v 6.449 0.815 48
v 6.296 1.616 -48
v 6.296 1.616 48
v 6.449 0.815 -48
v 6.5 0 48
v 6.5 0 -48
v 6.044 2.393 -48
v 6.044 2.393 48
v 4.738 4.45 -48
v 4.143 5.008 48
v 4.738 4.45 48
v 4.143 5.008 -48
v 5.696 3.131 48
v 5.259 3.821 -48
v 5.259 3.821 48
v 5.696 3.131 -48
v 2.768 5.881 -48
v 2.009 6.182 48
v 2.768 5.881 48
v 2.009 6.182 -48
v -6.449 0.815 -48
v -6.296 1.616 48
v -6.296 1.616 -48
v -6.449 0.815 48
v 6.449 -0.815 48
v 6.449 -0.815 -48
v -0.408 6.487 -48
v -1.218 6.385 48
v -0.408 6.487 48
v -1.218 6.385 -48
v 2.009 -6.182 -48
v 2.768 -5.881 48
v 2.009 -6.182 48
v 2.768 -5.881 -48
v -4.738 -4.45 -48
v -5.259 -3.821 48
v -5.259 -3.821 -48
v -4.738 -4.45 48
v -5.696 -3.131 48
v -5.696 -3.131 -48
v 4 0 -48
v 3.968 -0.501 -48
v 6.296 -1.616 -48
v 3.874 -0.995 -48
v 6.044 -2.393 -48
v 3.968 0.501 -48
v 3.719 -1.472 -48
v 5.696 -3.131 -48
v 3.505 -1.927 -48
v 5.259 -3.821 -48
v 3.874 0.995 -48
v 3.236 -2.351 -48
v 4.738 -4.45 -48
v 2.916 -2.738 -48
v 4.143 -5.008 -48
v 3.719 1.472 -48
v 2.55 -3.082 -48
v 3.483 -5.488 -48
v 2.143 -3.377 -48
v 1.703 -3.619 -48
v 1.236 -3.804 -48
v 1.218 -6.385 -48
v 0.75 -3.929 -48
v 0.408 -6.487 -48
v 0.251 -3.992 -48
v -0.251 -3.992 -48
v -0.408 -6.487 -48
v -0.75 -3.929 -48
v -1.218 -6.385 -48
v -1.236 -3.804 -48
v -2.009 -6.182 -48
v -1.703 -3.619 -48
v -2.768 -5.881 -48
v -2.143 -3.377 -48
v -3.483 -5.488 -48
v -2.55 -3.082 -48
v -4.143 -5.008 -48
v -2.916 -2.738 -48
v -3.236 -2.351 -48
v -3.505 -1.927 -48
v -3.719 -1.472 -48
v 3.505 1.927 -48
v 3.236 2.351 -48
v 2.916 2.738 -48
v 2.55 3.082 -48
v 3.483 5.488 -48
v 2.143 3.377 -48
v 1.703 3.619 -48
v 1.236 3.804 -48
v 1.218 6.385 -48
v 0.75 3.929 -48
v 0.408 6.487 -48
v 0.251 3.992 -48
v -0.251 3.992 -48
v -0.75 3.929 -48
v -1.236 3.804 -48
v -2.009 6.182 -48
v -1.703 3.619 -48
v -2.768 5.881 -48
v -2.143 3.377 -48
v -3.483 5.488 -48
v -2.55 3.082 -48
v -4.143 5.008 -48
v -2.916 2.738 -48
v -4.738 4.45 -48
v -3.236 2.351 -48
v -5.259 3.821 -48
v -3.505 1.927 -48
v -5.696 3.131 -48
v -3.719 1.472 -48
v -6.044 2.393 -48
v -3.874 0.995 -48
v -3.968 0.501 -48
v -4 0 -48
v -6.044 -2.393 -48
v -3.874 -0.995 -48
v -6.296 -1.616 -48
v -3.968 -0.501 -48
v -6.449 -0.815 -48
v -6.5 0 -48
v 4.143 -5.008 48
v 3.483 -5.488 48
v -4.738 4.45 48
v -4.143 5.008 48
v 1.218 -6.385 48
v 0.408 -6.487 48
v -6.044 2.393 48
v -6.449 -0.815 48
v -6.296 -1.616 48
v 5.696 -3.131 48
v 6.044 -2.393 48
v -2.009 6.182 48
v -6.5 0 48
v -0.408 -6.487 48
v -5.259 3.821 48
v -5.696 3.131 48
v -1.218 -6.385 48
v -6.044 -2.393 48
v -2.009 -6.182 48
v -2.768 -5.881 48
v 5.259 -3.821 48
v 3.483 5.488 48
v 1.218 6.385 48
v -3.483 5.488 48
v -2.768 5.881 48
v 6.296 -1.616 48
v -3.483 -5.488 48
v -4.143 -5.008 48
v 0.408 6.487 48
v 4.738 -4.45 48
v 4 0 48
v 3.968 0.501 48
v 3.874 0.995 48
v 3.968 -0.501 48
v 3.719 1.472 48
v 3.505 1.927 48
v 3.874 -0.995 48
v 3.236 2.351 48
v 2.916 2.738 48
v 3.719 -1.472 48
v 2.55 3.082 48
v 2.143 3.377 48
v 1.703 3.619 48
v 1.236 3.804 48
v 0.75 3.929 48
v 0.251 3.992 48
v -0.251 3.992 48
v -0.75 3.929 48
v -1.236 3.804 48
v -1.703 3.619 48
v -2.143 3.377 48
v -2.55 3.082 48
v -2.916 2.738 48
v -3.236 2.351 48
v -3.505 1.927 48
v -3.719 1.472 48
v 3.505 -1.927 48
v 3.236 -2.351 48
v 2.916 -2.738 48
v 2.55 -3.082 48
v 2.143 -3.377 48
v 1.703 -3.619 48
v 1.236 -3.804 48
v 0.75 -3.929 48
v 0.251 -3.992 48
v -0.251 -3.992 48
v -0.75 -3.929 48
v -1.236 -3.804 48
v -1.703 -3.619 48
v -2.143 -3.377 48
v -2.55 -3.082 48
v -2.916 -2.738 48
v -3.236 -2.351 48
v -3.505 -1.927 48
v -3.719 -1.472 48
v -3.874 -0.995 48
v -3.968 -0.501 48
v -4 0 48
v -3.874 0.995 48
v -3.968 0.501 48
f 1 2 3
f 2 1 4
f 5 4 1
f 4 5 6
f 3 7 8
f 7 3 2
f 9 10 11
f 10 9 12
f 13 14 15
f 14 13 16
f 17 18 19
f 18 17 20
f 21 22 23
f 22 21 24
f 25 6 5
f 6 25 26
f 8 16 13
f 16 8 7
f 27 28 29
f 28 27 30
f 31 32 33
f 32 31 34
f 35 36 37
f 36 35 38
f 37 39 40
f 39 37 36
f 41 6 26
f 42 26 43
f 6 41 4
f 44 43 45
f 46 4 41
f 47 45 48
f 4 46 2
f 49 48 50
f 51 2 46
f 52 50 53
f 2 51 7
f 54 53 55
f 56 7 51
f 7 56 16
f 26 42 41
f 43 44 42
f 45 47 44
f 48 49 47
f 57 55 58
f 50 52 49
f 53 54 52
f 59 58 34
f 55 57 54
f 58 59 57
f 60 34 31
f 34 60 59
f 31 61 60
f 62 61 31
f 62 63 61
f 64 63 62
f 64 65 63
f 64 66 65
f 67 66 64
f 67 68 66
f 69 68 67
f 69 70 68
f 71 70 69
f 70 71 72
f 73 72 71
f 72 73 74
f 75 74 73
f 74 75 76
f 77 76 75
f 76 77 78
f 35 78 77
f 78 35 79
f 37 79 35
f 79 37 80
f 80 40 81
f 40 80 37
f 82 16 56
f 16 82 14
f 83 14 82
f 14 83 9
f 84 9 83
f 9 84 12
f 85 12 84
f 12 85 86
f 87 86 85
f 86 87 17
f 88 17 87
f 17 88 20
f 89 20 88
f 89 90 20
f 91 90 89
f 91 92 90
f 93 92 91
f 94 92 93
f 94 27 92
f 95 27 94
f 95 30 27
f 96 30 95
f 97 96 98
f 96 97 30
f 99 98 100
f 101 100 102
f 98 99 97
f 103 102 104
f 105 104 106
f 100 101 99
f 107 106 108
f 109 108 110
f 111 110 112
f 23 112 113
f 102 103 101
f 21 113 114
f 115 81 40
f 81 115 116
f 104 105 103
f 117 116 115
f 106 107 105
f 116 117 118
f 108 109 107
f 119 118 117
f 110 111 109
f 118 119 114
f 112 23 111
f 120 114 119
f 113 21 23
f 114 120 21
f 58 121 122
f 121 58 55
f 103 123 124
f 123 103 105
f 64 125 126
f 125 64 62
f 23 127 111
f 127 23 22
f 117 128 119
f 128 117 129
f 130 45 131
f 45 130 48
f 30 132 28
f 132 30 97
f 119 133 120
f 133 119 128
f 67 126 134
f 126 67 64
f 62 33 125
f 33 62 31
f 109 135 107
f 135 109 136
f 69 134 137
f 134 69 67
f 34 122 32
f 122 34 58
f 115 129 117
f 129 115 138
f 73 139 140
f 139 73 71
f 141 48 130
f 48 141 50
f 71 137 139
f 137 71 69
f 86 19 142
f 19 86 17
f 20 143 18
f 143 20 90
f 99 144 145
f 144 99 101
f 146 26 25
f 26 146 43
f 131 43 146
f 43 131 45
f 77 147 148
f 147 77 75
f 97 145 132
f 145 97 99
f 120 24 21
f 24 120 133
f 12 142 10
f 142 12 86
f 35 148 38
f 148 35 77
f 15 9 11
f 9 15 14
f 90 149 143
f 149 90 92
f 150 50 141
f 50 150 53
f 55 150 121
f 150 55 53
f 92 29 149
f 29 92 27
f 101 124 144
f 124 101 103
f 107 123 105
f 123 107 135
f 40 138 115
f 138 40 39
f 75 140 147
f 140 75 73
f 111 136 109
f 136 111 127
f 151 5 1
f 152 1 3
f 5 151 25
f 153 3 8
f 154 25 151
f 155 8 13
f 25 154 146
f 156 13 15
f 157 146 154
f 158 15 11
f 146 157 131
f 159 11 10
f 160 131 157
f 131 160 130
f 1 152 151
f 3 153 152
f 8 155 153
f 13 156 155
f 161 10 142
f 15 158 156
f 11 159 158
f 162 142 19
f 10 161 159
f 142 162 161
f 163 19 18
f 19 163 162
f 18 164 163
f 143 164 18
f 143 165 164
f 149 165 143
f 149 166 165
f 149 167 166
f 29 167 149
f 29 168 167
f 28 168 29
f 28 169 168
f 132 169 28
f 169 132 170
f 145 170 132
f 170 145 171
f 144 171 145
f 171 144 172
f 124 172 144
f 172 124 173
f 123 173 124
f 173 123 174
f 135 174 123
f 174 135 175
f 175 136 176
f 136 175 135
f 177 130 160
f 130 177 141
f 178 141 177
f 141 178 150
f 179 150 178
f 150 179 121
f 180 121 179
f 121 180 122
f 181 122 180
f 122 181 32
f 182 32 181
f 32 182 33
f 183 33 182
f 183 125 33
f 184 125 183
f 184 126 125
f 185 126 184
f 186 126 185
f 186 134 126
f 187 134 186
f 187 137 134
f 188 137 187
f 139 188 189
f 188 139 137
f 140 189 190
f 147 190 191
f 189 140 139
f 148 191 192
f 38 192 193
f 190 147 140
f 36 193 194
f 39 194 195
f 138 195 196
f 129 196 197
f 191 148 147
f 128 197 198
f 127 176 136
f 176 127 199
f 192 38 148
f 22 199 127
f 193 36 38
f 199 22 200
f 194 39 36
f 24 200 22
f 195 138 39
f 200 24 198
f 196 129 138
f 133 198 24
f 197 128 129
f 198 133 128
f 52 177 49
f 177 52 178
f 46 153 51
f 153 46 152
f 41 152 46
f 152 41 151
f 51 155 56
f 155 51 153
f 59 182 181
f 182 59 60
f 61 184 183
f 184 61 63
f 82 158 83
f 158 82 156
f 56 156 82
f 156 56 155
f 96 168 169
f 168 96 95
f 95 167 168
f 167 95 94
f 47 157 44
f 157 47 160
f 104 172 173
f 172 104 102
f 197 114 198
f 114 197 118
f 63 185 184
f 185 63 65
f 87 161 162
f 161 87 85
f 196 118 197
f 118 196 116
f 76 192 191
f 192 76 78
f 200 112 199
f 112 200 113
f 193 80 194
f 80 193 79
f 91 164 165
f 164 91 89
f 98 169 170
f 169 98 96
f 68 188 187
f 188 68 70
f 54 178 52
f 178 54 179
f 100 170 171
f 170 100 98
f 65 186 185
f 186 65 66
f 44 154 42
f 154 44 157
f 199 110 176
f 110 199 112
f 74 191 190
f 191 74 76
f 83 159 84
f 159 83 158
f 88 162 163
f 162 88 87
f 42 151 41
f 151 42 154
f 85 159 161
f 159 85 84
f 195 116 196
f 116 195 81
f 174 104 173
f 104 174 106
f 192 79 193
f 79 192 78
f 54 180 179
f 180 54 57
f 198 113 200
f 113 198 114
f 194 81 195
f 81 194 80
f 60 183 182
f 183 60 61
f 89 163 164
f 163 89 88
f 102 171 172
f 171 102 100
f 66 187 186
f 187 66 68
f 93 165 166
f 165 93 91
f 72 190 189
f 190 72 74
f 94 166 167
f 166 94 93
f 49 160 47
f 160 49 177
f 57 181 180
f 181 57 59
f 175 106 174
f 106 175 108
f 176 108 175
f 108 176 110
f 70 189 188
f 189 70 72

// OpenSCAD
$fn = 50;


difference() {
	union() {
		translate(v = [0, 0, -48.0000000000]) {
			cylinder(h = 96, r = 6.5000000000);
		}
	}
	union() {
		translate(v = [0, 0, -100.0000000000]) {
			cylinder(h = 200, r = 4.0000000000);
		}
	}
}
